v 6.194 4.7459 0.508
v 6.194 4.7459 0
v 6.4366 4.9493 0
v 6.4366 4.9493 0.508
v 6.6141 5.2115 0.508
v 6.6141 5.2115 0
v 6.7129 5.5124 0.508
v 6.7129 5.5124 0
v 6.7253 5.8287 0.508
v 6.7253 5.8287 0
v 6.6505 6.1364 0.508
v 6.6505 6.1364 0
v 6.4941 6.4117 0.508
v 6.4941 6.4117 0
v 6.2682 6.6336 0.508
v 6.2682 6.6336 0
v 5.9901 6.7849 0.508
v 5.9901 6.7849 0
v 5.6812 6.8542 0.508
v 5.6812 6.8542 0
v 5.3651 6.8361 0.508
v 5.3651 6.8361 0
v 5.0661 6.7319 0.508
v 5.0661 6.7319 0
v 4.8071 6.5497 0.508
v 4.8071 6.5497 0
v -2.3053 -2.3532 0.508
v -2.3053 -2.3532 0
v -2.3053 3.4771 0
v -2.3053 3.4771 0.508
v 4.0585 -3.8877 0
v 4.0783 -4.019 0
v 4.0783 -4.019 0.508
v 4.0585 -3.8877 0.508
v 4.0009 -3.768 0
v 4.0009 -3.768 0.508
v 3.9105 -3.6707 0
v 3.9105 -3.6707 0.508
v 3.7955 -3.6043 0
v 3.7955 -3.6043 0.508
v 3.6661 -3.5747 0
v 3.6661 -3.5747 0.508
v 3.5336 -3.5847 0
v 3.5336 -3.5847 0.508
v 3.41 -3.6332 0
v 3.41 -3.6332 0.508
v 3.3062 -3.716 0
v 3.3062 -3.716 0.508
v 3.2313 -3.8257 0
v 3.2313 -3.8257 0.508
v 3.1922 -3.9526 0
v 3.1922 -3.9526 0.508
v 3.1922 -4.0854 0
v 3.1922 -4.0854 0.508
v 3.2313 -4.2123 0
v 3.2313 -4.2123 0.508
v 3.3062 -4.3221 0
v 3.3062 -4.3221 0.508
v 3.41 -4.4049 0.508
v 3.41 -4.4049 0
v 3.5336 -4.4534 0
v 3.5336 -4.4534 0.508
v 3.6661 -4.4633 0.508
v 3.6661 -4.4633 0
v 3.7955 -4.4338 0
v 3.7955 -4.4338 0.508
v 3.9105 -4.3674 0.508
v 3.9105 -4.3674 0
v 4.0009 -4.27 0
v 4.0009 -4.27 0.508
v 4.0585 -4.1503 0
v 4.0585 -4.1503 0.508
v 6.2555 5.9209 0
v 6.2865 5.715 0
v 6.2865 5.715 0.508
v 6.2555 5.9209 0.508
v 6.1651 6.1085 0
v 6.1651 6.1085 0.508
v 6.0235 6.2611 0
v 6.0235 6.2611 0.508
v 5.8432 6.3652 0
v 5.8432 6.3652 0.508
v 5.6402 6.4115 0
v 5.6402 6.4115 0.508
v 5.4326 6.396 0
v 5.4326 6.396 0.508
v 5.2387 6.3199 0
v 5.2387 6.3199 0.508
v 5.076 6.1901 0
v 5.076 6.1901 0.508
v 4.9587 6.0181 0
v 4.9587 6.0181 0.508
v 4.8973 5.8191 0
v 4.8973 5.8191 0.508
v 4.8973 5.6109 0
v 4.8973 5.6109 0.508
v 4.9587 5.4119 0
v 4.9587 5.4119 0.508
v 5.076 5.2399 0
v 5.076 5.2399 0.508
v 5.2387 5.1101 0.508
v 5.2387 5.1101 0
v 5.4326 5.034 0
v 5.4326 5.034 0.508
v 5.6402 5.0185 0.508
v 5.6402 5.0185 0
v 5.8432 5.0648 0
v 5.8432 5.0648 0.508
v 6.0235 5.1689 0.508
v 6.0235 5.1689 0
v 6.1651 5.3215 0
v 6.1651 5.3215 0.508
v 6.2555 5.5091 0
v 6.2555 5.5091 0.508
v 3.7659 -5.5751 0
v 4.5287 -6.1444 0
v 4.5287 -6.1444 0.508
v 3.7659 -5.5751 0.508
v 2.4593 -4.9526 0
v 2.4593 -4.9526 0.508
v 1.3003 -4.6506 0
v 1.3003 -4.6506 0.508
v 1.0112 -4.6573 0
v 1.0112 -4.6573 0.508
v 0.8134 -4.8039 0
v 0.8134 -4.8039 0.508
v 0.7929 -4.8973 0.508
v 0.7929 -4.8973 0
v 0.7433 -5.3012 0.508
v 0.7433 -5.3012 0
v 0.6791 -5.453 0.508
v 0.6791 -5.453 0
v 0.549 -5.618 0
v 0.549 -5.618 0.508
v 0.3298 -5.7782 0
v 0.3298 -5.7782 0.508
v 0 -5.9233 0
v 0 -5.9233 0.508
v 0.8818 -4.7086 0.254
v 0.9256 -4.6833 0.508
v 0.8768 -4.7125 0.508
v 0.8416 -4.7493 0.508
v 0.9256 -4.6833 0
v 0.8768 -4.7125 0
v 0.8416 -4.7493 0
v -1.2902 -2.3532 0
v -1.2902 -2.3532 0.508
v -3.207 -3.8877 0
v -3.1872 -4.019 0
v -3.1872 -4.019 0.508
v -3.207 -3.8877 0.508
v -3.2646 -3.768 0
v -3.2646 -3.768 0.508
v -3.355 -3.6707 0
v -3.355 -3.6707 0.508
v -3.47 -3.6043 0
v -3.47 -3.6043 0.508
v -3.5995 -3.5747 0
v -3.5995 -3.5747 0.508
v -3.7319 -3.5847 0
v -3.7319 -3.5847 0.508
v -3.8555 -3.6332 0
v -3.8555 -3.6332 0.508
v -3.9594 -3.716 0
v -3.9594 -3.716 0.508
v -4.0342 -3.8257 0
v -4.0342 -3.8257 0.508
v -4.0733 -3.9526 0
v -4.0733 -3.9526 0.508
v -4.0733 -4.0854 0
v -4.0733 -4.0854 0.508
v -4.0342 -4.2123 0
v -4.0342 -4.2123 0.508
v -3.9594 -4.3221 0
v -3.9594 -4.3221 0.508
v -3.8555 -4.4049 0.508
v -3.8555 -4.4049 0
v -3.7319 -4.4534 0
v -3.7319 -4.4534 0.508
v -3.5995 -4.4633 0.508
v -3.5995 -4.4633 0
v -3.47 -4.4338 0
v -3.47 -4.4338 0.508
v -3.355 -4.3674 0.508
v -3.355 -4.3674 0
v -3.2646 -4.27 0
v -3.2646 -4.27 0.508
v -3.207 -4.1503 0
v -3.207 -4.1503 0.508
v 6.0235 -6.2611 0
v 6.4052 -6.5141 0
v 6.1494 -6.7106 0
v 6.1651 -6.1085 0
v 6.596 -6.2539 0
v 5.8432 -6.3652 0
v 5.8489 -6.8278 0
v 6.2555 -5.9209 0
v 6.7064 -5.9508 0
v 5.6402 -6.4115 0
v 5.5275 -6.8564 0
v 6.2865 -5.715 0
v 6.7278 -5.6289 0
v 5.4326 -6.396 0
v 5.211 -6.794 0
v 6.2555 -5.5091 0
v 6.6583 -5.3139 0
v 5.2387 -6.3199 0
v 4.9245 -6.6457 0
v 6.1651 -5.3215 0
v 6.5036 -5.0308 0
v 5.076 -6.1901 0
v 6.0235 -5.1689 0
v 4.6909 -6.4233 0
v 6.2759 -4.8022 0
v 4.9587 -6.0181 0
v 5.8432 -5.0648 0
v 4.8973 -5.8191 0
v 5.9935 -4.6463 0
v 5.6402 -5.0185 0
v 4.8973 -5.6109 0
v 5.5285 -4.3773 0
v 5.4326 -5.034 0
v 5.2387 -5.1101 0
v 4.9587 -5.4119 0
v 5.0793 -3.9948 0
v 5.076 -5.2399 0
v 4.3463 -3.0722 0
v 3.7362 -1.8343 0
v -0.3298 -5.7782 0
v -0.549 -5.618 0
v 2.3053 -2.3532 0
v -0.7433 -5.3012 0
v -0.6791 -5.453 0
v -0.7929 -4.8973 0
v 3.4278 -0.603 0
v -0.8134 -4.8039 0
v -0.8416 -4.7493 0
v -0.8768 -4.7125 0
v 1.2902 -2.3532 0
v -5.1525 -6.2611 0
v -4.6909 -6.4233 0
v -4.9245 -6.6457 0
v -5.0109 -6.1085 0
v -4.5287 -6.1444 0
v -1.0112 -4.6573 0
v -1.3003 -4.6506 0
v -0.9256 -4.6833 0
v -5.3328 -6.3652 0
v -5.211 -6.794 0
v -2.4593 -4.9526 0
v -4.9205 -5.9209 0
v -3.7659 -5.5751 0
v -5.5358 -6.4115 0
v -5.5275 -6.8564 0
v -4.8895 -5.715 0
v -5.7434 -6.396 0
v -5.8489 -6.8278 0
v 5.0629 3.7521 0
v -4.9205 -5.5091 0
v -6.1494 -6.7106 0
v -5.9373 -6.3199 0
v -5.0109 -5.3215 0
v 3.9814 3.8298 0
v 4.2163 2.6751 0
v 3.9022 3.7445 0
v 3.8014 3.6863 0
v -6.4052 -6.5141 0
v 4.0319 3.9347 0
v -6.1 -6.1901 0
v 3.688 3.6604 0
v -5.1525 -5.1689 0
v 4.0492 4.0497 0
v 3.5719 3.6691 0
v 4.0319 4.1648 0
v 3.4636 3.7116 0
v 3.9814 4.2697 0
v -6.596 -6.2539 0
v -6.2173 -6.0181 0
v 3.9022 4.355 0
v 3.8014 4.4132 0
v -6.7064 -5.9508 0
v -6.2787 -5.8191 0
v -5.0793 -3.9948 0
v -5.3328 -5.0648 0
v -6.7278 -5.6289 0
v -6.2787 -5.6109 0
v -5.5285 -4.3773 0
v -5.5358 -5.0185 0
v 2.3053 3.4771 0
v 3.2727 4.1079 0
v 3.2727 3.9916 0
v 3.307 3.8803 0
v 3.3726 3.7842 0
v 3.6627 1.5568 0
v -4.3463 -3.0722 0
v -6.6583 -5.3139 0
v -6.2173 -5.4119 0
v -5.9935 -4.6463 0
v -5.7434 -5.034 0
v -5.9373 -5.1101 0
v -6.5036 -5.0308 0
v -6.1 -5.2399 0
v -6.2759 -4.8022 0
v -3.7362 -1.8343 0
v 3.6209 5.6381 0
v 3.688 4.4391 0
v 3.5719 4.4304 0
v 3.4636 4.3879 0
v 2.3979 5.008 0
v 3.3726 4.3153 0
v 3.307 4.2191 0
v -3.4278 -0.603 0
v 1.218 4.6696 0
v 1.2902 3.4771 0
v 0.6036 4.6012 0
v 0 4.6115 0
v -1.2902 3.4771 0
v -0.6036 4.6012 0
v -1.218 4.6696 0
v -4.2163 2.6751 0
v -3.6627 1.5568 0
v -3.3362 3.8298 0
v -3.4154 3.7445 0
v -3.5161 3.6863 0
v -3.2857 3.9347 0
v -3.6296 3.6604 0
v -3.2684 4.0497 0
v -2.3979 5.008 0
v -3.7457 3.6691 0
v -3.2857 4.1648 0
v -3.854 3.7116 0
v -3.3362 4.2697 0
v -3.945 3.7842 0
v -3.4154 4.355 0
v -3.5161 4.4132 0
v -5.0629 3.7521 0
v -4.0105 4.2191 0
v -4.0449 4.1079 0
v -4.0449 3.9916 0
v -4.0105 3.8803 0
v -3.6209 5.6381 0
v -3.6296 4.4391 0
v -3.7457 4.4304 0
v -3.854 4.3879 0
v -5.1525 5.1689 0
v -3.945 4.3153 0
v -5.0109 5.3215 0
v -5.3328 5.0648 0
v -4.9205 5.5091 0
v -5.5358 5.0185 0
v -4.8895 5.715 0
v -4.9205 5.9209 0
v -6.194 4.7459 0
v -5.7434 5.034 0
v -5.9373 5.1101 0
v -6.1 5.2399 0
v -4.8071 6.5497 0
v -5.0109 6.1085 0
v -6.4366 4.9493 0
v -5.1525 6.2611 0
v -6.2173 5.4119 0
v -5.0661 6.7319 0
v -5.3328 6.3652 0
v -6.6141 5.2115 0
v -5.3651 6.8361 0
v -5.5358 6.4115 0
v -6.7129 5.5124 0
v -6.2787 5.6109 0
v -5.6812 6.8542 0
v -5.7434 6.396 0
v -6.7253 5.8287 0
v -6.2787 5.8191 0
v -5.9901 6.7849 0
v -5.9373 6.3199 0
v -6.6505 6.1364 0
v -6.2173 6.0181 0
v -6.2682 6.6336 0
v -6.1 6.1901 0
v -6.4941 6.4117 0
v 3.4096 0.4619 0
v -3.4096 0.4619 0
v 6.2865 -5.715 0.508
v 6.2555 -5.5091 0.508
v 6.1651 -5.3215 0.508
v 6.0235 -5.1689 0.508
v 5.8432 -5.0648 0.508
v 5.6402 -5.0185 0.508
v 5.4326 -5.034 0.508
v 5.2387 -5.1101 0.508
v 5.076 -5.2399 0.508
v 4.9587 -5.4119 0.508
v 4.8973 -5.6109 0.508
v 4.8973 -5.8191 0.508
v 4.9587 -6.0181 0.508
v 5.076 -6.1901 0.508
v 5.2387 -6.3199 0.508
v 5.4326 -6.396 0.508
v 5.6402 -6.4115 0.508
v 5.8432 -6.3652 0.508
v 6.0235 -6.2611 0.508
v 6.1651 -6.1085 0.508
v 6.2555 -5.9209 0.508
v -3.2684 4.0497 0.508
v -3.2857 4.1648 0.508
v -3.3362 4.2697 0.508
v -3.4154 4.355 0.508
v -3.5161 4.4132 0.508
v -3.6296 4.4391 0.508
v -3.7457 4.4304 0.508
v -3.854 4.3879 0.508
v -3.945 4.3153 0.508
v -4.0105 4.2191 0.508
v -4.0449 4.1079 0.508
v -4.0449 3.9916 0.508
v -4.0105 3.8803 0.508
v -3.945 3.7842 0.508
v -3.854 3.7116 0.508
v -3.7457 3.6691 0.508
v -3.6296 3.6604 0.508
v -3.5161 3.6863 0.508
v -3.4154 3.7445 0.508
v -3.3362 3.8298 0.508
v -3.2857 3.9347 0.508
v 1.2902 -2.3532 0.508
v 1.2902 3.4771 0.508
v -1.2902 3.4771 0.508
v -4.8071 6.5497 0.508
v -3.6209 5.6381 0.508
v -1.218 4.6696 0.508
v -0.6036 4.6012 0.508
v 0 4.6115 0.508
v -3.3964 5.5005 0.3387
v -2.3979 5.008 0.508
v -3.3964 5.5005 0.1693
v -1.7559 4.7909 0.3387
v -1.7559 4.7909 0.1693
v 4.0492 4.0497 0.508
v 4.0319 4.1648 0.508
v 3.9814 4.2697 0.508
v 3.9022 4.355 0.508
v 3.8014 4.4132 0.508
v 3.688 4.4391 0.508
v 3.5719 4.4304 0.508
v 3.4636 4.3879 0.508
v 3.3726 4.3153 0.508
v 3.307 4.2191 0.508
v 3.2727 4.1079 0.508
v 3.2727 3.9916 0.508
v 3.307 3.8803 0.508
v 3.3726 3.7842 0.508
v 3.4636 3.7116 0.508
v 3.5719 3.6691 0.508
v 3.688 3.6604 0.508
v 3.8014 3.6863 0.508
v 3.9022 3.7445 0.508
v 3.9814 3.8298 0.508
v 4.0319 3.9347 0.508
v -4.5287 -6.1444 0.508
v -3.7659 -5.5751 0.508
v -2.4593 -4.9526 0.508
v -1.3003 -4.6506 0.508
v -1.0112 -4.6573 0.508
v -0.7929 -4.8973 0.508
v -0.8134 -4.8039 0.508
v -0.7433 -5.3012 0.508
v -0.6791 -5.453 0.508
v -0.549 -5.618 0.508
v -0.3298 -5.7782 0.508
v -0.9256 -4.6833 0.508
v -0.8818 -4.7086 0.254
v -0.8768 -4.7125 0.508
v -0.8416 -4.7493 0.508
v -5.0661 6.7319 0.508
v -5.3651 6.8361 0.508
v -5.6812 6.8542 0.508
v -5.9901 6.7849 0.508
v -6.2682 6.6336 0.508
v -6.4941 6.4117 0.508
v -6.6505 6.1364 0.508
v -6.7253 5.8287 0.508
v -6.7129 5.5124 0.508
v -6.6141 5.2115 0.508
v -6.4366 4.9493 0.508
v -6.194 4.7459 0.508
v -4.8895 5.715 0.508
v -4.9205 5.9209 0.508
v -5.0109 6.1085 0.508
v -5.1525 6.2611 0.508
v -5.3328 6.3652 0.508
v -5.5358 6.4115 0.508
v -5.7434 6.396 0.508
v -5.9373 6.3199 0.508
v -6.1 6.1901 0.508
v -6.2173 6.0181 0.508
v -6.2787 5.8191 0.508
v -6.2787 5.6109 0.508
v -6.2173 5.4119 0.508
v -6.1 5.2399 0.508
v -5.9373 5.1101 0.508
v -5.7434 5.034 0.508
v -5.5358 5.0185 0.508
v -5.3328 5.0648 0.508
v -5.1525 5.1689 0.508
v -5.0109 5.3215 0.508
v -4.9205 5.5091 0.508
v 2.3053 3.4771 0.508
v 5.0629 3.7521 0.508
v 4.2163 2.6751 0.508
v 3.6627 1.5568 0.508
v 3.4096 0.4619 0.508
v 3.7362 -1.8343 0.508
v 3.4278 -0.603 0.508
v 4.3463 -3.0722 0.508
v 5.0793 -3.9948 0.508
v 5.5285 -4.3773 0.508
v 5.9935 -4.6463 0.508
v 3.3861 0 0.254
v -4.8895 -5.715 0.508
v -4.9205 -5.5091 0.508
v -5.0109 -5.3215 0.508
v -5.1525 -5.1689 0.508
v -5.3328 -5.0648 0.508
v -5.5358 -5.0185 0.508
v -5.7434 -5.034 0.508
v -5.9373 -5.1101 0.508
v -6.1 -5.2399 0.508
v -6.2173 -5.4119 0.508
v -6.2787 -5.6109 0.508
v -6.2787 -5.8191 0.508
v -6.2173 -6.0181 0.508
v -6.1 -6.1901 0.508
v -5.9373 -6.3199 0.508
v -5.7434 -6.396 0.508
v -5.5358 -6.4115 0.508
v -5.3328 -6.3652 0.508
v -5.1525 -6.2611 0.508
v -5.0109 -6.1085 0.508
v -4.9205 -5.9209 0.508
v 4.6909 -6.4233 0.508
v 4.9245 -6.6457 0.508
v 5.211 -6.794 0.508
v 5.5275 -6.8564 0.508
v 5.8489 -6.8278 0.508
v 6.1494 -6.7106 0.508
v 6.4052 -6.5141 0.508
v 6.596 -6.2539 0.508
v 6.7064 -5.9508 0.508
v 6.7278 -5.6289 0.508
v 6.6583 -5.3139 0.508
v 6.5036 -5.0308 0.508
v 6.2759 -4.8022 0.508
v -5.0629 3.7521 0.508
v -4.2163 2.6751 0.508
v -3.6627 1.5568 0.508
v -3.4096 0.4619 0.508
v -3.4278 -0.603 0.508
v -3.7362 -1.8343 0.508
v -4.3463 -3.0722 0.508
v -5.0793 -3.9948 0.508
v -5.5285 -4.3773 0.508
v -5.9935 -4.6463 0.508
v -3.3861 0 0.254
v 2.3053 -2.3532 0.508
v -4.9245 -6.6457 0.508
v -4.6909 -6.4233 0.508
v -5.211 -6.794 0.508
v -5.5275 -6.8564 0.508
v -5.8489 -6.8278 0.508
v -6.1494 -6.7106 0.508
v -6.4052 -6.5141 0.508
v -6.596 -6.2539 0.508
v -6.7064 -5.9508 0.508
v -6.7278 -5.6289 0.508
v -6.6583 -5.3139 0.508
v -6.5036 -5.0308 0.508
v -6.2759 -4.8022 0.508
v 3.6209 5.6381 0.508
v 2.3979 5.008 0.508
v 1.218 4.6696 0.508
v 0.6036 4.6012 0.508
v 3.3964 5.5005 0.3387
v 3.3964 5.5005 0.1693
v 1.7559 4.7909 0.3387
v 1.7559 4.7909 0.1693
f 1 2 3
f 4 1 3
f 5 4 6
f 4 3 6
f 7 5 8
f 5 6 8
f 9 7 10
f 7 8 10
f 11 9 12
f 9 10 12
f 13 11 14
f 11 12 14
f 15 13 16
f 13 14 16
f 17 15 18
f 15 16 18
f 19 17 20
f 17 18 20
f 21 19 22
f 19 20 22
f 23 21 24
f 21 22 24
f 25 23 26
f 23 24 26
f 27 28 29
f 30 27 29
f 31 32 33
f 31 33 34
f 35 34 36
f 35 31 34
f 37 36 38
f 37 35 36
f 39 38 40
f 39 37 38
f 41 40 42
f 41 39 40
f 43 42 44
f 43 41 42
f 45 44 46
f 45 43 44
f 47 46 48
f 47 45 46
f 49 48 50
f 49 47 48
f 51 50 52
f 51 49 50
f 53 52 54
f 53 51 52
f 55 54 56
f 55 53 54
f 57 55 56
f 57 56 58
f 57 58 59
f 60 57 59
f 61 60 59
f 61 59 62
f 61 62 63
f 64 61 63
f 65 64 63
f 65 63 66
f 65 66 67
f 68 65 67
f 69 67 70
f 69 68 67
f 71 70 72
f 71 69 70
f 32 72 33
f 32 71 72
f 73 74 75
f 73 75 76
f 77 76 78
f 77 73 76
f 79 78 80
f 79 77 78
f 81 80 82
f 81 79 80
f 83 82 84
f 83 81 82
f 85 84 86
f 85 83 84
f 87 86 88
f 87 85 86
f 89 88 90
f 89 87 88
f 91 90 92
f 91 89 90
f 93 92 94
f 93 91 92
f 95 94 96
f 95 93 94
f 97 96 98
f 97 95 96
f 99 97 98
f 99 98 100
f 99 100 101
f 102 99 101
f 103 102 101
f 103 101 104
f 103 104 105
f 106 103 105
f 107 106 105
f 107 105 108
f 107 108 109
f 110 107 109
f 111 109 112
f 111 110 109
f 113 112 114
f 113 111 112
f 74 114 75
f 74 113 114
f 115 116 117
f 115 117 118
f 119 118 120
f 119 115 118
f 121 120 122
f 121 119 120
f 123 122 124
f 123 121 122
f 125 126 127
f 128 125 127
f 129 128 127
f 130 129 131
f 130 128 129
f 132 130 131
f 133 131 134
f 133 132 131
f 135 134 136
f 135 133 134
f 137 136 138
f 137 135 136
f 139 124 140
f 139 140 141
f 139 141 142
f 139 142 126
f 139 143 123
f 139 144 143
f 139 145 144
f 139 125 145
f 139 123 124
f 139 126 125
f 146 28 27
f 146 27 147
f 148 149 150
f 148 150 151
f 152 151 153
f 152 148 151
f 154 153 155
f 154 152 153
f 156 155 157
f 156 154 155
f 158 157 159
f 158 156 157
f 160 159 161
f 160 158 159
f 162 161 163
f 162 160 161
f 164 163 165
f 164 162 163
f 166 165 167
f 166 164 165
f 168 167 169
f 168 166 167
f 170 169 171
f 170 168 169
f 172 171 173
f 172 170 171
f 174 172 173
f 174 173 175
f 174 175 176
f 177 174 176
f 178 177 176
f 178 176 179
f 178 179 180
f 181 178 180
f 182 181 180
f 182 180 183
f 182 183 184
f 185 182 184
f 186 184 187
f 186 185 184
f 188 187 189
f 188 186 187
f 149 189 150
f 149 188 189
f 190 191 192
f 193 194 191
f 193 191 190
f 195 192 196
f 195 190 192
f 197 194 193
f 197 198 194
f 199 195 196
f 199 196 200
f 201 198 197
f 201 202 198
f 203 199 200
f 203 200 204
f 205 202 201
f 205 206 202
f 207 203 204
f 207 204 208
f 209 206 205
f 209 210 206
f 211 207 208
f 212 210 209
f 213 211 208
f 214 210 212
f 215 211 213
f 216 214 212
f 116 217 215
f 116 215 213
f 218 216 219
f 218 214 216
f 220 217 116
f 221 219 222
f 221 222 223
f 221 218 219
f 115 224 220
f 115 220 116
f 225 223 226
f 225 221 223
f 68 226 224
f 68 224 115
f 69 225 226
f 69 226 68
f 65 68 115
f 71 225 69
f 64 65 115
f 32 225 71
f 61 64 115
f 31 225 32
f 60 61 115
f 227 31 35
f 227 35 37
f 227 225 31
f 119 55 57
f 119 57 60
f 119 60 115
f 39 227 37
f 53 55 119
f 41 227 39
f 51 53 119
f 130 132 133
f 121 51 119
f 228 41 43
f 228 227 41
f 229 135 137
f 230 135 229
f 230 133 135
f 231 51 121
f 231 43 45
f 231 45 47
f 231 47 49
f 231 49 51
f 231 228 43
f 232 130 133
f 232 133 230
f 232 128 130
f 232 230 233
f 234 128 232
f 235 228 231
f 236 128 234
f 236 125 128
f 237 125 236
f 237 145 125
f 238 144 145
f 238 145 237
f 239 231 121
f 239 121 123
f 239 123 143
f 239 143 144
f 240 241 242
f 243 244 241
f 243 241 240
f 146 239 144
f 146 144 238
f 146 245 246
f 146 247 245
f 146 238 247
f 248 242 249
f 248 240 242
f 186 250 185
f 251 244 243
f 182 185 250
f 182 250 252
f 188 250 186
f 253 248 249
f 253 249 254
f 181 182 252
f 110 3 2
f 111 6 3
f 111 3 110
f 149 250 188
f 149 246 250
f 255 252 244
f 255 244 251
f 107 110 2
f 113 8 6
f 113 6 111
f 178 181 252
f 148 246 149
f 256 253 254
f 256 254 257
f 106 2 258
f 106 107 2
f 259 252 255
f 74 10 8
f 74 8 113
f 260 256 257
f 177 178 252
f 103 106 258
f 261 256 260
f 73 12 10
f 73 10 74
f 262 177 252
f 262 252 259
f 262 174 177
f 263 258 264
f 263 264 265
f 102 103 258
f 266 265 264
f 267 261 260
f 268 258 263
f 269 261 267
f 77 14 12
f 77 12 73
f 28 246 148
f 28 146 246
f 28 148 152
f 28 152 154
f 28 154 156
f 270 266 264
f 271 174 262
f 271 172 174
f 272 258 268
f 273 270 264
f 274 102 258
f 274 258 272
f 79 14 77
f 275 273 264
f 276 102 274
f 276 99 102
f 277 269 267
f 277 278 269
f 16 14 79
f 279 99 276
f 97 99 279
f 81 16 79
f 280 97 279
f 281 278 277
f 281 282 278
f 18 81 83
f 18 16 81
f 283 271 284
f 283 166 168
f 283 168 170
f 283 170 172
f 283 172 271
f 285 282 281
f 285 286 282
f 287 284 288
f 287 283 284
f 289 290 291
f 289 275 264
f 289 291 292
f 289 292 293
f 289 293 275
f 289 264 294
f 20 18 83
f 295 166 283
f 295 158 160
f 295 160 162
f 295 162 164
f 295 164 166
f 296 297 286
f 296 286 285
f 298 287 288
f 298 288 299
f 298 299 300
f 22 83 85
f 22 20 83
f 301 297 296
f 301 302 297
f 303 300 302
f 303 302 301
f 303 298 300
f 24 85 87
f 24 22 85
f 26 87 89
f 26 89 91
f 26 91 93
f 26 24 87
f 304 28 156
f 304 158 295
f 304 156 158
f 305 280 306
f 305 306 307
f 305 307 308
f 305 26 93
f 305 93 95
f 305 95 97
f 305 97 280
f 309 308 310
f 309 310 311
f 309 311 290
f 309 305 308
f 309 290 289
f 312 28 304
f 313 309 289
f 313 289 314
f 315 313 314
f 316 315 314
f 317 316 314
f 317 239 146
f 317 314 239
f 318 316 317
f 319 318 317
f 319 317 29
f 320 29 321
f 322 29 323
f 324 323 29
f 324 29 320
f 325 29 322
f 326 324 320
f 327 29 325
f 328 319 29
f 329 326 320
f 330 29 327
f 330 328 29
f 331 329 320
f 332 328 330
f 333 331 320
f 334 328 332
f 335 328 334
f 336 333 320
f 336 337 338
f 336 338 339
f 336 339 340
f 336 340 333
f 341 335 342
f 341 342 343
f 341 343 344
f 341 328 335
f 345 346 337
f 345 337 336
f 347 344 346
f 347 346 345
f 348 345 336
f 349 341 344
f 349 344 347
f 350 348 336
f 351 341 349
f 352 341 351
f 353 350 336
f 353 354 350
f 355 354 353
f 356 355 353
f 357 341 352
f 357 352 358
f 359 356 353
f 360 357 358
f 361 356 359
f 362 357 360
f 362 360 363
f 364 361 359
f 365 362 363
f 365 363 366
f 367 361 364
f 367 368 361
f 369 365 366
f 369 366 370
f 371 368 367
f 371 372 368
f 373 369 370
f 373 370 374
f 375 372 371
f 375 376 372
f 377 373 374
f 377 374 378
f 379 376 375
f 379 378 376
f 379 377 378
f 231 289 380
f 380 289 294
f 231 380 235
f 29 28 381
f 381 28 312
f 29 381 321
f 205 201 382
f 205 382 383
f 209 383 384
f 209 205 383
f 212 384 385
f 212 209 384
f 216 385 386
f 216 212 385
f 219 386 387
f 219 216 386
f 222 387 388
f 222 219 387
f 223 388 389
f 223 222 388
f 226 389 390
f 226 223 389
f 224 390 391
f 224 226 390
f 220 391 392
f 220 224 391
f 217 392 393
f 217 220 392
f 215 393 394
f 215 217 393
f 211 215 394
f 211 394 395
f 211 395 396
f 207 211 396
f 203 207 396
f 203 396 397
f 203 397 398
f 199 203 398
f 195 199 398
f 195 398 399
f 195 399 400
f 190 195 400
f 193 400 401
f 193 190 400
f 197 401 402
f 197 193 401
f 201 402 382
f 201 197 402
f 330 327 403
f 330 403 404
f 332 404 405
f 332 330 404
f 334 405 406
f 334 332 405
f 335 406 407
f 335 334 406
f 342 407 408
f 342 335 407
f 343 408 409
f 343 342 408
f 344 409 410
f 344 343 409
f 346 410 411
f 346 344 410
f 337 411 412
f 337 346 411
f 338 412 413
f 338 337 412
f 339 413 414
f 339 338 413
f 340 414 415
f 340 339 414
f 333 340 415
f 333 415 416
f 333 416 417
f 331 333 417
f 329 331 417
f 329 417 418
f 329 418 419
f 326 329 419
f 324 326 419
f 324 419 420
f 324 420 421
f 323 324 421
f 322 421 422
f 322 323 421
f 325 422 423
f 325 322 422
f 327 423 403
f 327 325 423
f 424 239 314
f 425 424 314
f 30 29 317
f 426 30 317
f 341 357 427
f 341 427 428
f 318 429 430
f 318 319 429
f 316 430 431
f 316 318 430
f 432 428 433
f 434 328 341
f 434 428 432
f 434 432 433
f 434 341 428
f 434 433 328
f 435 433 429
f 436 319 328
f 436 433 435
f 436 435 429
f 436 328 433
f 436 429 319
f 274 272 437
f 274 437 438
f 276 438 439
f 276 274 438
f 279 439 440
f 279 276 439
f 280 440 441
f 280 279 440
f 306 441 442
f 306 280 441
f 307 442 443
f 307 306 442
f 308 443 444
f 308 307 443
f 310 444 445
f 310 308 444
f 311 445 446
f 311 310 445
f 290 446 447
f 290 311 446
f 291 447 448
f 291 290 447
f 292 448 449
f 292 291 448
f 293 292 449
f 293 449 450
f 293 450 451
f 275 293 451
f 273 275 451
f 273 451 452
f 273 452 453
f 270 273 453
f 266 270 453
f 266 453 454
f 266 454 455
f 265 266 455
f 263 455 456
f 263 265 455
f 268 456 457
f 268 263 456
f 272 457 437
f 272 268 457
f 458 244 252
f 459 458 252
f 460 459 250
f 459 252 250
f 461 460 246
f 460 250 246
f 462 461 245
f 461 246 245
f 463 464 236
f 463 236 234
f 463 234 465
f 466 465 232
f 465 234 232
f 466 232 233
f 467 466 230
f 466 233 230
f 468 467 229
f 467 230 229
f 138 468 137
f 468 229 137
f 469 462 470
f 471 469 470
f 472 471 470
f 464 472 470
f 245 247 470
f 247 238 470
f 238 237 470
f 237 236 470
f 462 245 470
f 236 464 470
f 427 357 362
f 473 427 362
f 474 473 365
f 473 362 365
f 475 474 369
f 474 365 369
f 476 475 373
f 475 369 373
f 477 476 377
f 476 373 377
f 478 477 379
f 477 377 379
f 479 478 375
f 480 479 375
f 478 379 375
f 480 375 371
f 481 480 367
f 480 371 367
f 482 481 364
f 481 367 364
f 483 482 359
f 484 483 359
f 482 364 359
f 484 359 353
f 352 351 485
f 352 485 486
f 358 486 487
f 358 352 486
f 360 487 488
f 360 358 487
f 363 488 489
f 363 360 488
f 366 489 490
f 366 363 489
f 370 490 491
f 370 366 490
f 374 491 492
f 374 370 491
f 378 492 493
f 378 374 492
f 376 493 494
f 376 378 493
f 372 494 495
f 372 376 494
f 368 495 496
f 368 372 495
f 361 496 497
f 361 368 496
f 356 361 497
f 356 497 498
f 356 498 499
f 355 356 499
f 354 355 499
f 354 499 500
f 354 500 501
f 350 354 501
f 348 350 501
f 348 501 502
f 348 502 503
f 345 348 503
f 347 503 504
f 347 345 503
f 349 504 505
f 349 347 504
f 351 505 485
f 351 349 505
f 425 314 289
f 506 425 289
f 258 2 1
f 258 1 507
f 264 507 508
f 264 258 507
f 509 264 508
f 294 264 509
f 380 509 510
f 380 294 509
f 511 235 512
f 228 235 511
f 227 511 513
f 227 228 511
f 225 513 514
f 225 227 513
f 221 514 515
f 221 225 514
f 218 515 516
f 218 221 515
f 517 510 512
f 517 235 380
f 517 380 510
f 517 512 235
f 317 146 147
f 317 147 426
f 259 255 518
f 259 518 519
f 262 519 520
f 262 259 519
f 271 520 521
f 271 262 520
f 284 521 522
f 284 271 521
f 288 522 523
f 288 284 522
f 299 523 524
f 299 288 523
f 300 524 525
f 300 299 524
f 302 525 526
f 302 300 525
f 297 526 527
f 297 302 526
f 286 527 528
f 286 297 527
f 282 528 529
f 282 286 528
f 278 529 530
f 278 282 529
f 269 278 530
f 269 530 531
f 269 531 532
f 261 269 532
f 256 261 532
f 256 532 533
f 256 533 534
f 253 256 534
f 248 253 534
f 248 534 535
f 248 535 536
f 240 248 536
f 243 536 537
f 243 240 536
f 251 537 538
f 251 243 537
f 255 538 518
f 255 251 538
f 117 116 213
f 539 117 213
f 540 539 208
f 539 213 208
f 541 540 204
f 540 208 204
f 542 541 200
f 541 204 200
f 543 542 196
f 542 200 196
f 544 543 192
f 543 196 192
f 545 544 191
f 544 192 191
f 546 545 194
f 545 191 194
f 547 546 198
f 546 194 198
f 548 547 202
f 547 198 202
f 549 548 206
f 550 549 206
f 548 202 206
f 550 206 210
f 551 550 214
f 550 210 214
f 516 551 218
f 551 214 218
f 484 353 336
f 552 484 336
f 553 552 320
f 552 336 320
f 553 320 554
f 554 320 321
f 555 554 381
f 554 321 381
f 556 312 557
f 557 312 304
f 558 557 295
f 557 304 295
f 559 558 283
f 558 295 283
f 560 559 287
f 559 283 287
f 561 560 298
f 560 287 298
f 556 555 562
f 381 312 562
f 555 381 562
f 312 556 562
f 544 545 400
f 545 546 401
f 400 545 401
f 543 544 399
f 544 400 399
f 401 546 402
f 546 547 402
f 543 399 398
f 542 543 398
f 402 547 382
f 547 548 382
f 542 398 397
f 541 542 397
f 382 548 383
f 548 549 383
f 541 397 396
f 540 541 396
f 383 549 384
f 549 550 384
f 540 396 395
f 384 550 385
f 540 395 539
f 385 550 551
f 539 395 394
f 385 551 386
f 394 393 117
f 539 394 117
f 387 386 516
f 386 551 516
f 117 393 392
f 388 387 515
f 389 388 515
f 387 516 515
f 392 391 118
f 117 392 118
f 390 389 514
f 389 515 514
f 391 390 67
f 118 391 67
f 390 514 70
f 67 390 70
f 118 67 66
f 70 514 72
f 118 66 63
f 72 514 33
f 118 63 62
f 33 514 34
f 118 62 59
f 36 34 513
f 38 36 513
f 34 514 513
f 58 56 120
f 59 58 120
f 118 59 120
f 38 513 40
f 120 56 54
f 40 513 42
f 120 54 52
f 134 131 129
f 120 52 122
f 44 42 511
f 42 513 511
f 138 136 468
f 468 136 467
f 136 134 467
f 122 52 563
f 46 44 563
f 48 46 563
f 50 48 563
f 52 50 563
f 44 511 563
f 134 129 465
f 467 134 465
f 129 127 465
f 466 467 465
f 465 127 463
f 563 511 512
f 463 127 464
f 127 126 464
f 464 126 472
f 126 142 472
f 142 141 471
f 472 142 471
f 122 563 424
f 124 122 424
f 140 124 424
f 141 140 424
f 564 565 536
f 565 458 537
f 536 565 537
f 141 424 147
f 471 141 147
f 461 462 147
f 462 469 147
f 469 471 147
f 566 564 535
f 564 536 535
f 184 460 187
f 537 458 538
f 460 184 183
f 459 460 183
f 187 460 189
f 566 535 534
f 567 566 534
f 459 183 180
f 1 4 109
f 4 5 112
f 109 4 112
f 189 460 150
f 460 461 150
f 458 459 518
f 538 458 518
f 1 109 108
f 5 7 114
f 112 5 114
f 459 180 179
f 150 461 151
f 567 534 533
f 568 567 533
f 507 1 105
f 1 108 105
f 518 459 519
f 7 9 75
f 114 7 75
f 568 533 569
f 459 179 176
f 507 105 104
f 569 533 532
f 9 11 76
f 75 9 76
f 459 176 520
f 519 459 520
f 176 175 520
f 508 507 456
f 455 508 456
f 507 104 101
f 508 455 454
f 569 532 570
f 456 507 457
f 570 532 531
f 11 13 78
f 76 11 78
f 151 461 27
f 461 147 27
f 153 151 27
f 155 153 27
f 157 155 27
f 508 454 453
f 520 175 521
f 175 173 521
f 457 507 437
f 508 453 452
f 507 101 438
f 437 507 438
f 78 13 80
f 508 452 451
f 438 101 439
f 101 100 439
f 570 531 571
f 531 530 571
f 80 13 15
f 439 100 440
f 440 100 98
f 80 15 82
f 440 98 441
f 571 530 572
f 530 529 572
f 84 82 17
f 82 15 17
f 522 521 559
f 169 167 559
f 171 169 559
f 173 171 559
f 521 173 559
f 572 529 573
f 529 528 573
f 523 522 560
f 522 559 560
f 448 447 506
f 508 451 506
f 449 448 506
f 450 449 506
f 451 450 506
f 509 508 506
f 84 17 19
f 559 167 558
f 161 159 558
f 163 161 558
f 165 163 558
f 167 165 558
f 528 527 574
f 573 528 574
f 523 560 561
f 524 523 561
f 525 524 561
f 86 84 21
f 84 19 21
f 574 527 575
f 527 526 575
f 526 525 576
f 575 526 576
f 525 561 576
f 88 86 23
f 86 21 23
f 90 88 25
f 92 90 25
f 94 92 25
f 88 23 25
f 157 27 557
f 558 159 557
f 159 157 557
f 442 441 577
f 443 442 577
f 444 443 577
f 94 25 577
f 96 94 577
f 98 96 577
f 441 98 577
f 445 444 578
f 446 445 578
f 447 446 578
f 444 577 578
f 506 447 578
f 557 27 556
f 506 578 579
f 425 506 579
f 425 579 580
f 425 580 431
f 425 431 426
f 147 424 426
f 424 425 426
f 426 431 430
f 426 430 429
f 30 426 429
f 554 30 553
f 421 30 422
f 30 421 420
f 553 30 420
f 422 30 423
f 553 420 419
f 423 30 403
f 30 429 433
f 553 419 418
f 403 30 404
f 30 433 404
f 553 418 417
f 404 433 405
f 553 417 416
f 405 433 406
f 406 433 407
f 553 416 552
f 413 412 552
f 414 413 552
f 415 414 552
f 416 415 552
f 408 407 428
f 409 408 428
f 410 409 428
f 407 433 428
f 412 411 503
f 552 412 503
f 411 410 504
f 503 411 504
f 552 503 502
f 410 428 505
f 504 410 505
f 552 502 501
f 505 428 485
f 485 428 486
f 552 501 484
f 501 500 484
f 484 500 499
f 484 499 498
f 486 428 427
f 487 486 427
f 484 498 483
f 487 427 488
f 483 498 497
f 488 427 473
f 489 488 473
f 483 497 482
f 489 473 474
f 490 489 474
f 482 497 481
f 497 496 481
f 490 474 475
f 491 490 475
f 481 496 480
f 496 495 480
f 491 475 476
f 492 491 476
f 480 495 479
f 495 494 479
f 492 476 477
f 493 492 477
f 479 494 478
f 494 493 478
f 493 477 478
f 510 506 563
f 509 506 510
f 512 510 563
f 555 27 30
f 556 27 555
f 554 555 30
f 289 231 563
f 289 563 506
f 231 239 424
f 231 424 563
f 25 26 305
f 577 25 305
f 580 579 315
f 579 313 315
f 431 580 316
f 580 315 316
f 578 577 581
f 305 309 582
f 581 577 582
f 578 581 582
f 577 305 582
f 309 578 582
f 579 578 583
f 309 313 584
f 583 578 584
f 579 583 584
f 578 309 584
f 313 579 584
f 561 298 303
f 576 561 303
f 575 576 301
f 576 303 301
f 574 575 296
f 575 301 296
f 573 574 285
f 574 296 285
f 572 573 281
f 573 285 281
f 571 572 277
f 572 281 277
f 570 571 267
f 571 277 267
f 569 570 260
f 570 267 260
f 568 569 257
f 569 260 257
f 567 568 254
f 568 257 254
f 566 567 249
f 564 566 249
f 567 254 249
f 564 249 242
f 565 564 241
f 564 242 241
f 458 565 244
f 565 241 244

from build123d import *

# Parameters (mm, degrees)
F0_R     = 0.6985
F0_R_2   = 0.4455322906
F0_W     = 1.0151027236
F0_H     = 5.8303333353
F0_R_3   = 0.3904241603
F1_DEPTH = 0.508


with BuildPart() as f1:
    # F0 (on Top) → F1 (new body)
    with BuildSketch(Plane.XY):
        with BuildLine():
            add(Edge.make_bspline(
                [(-4.8071383511, 6.5496880167), (-3.5494174307, 5.3943343251), (-1.775382203, 4.4622034766), (0, 4.6114819124)],
                knots=[0, 0, 0, 0, 5.1831671813, 5.1831671813, 5.1831671813, 5.1831671813], degree=3))
            ThreePointArc((-4.8071383511, 6.5496880167), (-6.4941252197, 6.4116965525), (-6.1940324141, 4.7458902471))
            add(Edge.make_bspline(
                [(-6.1940324141, 4.7458902471), (-4.693901011, 3.6446792104), (-2.0902496032, 0.2759509244), (-4.6702187254, -4.0639645625), (-5.9934721436, -4.646336657)],
                knots=[0, 0, 0, 0, 0.5042985744, 1, 1, 1, 1], degree=3))
            ThreePointArc((-5.9934721436, -4.646336657), (-6.4052483977, -6.5140957742), (-4.5287124963, -6.1443704514))
            add(Edge.make_bspline(
                [(-4.5287124963, -6.1443704514), (-3.6492146823, -5.2652203685), (0.1529797259, -3.8611909007), (-1.1026566893, -5.5442661801), (0, -5.9233158827)],
                knots=[0, 0, 0, 0, 0.6177222982, 1, 1, 1, 1], degree=3))
            add(Edge.make_bspline(
                [(4.5287124963, -6.1443704514), (3.6492146823, -5.2652203685), (-0.1529797259, -3.8611909007), (1.1026566893, -5.5442661801), (0, -5.9233158827)],
                knots=[0, 0, 0, 0, 0.6177222982, 1, 1, 1, 1], degree=3))
            ThreePointArc((4.5287124963, -6.1443704514), (6.4052483977, -6.5140957742), (5.9934721436, -4.646336657))
            add(Edge.make_bspline(
                [(6.1940324141, 4.7458902471), (4.693901011, 3.6446792104), (2.0902496032, 0.2759509244), (4.6702187254, -4.0639645625), (5.9934721436, -4.646336657)],
                knots=[0, 0, 0, 0, 0.5042985744, 1, 1, 1, 1], degree=3))
            ThreePointArc((6.1940324141, 4.7458902471), (6.4941252197, 6.4116965525), (4.8071383511, 6.5496880167))
            add(Edge.make_bspline(
                [(4.8071383511, 6.5496880167), (3.5494174307, 5.3943343251), (1.775382203, 4.4622034766), (0, 4.6114819124)],
                knots=[0, 0, 0, 0, 5.1831671813, 5.1831671813, 5.1831671813, 5.1831671813], degree=3))
        make_face()
        with Locations((-5.588, -5.715)):
            Circle(F0_R, mode=Mode.SUBTRACT)
        with Locations((-3.6327592097, -4.0190205909)):
            Circle(F0_R_2, mode=Mode.SUBTRACT)
        with Locations((5.588, -5.715)):
            Circle(F0_R, mode=Mode.SUBTRACT)
        with Locations((3.6327592097, -4.0190205909)):
            Circle(F0_R_2, mode=Mode.SUBTRACT)
        with Locations((-1.7977658426, 0.5619557342)):
            Rectangle(F0_W, F0_H, mode=Mode.SUBTRACT)
        with Locations((-3.6587875802, 4.049744457)):
            Circle(F0_R_3, mode=Mode.SUBTRACT)
        with Locations((-5.588, 5.715)):
            Circle(F0_R, mode=Mode.SUBTRACT)
        with Locations((1.7977658426, 0.5619557342)):
            Rectangle(F0_W, F0_H, mode=Mode.SUBTRACT)
        with Locations((3.6587875802, 4.049744457)):
            Circle(F0_R_3, mode=Mode.SUBTRACT)
        with Locations((5.588, 5.715)):
            Circle(F0_R, mode=Mode.SUBTRACT)
    extrude(amount=F1_DEPTH)


solid = f1.part
